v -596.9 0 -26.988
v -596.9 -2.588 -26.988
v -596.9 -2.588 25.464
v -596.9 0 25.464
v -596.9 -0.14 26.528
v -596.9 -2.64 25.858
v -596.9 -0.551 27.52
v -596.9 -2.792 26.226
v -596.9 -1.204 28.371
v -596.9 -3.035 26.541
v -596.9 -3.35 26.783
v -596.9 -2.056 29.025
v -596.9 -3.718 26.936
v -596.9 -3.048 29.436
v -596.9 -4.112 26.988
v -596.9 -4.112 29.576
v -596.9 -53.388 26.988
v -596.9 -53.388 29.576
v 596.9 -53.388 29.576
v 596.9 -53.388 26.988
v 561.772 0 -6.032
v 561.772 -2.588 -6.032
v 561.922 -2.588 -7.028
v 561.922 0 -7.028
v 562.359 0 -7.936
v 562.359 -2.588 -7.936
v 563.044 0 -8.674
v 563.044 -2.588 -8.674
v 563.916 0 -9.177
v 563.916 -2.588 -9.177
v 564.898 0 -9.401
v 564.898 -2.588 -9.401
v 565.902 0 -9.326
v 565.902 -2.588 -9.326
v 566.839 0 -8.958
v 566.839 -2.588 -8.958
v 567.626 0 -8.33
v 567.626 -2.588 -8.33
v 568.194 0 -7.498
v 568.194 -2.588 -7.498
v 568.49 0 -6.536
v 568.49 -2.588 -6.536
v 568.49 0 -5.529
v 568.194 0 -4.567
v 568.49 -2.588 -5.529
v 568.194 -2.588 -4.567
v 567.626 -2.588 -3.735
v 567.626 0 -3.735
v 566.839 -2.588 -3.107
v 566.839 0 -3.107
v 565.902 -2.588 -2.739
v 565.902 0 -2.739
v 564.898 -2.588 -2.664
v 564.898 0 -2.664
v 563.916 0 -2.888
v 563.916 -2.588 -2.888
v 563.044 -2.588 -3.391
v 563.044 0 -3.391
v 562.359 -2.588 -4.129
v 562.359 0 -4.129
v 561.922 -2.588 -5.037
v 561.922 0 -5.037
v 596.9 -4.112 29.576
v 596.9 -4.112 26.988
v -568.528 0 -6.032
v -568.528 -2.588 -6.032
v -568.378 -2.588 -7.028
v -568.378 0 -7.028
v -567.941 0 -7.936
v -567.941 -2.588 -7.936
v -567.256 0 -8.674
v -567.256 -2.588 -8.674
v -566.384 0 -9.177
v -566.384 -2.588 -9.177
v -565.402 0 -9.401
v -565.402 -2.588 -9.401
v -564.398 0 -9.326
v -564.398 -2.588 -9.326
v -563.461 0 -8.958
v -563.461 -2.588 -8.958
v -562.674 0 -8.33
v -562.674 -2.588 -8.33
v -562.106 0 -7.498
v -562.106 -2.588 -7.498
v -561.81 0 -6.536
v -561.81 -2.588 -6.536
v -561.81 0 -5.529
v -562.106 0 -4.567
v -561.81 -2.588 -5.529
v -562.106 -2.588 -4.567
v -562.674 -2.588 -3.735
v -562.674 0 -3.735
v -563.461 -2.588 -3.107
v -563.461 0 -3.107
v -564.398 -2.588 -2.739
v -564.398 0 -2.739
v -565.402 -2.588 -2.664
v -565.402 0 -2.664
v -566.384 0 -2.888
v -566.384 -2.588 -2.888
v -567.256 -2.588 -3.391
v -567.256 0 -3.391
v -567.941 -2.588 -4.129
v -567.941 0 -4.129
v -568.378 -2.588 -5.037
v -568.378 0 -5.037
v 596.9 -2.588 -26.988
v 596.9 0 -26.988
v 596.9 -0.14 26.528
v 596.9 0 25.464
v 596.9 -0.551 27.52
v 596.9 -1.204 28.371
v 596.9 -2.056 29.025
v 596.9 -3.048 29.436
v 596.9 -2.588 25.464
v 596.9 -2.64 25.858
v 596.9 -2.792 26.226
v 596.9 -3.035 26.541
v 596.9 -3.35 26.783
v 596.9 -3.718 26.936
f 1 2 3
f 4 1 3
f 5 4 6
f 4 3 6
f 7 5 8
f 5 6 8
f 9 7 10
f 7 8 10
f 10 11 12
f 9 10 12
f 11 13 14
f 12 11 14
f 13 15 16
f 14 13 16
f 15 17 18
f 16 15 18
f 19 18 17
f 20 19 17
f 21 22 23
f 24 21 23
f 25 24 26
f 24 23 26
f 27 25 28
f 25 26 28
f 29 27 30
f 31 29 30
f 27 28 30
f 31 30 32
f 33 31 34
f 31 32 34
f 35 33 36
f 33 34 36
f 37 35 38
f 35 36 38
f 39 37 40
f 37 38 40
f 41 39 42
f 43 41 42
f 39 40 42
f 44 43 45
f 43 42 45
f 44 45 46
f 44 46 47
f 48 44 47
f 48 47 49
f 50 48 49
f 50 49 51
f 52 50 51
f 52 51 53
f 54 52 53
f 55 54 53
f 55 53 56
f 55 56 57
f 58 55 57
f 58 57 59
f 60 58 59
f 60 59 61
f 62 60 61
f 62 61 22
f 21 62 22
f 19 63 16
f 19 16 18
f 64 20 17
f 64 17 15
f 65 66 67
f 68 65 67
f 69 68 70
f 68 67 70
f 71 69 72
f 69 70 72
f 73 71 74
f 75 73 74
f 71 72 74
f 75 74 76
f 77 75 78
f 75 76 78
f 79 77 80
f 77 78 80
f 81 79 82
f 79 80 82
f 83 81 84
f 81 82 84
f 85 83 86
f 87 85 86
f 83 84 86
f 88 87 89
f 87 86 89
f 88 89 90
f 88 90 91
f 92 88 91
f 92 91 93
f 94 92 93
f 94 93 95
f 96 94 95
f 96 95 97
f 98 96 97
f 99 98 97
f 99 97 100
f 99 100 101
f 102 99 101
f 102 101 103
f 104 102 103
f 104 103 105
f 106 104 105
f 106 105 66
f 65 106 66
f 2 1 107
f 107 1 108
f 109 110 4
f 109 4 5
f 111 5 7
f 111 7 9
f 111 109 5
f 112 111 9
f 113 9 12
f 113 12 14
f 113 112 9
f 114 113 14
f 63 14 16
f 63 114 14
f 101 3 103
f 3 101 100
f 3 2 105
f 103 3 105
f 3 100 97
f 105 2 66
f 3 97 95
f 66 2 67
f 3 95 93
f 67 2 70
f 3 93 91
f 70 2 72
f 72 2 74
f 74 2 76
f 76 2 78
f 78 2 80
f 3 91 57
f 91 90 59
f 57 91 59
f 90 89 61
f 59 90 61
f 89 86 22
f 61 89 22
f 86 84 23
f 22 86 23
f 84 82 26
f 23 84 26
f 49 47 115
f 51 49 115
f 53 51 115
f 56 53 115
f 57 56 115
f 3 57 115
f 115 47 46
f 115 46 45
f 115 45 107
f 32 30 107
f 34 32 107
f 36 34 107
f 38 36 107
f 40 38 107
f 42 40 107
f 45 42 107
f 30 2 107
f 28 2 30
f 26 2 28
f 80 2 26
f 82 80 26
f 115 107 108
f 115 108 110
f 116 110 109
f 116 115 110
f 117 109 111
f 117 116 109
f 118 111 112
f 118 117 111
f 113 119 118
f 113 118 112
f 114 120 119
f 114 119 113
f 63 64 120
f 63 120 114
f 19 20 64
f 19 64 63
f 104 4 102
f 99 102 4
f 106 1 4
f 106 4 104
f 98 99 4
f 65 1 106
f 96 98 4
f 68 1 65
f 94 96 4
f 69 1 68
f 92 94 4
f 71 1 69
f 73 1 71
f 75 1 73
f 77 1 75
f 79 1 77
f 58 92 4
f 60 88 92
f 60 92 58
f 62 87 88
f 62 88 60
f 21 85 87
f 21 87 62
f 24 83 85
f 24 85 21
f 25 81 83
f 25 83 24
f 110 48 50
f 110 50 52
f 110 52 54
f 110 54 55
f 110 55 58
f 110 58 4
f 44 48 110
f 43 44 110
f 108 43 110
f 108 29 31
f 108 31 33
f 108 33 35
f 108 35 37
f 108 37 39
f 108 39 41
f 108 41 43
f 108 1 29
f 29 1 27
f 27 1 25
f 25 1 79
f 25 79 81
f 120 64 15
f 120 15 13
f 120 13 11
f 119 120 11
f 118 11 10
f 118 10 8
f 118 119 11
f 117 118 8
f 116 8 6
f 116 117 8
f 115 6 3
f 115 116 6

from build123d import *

# Parameters (mm, degrees)
SKETCH1_W                    = 1193.8
SKETCH1_H                    = 53.975
BASE_FLANGE1_DEPTH           = 2.58826
EDGE_FLANGE1_STRIP_W         = 13.40104
EDGE_FLANGE1_STRIP_H         = 2.58826
EDGE_FLANGE1_STRIP_CUT_DEPTH = 1193.8
EDGE_FLANGE1_DEPTH           = 1193.8
F_1_4_CLEARANCE_HOLE1_D      = 6.7564


# Sheet-metal steps are written as plain solids
with BuildPart() as part:
    # Sketch1 → Base-Flange1 (new body)
    with BuildSketch(Plane(origin=(0, 0, 0), x_dir=(1, 0, 0), z_dir=(0, 1, 0))):
        Rectangle(SKETCH1_W, SKETCH1_H)
    extrude(amount=-BASE_FLANGE1_DEPTH)

    # Edge-Flange1 strip (across the edge) → Edge-Flange1 strip cut (cut)
    with BuildSketch(Plane(origin=(596.9, -2.58826, 26.9875), x_dir=(0, 0, -1), z_dir=(-1, 0, 0))):
        with Locations((-5.17652, -1.29413)):
            Rectangle(EDGE_FLANGE1_STRIP_W, EDGE_FLANGE1_STRIP_H)
    extrude(amount=EDGE_FLANGE1_STRIP_CUT_DEPTH, mode=Mode.SUBTRACT)

    # Edge-Flange1 section (across the edge) → Edge-Flange1 (add)
    with BuildSketch(Plane(origin=(596.9, -2.58826, 26.9875), x_dir=(0, 0, -1), z_dir=(-1, 0, 0))):
        with BuildLine():
            Line((-2.58826, 1.524), (-2.58826, 50.8))
            Line((-2.58826, 50.8), (0, 50.8))
            Line((0, 50.8), (0, 1.524))
            ThreePointArc((0, 1.524), (0.446369265, 0.446369265), (1.524, 0))
            Line((1.524, 0), (1.524, -2.58826))
            ThreePointArc((1.524, -2.58826), (-1.383806932, -1.383806932), (-2.58826, 1.524))
        make_face()
    extrude(amount=EDGE_FLANGE1_DEPTH)

    # 1/4 Clearance Hole1 (through all)
    with Locations(Plane(origin=(0, 0, 0), x_dir=(1, 0, 0), z_dir=(0, 1, 0))):
        with Locations((565.15, 6.0325), (-565.15, 6.0325)):
            Hole(F_1_4_CLEARANCE_HOLE1_D / 2)


solid = part.part
